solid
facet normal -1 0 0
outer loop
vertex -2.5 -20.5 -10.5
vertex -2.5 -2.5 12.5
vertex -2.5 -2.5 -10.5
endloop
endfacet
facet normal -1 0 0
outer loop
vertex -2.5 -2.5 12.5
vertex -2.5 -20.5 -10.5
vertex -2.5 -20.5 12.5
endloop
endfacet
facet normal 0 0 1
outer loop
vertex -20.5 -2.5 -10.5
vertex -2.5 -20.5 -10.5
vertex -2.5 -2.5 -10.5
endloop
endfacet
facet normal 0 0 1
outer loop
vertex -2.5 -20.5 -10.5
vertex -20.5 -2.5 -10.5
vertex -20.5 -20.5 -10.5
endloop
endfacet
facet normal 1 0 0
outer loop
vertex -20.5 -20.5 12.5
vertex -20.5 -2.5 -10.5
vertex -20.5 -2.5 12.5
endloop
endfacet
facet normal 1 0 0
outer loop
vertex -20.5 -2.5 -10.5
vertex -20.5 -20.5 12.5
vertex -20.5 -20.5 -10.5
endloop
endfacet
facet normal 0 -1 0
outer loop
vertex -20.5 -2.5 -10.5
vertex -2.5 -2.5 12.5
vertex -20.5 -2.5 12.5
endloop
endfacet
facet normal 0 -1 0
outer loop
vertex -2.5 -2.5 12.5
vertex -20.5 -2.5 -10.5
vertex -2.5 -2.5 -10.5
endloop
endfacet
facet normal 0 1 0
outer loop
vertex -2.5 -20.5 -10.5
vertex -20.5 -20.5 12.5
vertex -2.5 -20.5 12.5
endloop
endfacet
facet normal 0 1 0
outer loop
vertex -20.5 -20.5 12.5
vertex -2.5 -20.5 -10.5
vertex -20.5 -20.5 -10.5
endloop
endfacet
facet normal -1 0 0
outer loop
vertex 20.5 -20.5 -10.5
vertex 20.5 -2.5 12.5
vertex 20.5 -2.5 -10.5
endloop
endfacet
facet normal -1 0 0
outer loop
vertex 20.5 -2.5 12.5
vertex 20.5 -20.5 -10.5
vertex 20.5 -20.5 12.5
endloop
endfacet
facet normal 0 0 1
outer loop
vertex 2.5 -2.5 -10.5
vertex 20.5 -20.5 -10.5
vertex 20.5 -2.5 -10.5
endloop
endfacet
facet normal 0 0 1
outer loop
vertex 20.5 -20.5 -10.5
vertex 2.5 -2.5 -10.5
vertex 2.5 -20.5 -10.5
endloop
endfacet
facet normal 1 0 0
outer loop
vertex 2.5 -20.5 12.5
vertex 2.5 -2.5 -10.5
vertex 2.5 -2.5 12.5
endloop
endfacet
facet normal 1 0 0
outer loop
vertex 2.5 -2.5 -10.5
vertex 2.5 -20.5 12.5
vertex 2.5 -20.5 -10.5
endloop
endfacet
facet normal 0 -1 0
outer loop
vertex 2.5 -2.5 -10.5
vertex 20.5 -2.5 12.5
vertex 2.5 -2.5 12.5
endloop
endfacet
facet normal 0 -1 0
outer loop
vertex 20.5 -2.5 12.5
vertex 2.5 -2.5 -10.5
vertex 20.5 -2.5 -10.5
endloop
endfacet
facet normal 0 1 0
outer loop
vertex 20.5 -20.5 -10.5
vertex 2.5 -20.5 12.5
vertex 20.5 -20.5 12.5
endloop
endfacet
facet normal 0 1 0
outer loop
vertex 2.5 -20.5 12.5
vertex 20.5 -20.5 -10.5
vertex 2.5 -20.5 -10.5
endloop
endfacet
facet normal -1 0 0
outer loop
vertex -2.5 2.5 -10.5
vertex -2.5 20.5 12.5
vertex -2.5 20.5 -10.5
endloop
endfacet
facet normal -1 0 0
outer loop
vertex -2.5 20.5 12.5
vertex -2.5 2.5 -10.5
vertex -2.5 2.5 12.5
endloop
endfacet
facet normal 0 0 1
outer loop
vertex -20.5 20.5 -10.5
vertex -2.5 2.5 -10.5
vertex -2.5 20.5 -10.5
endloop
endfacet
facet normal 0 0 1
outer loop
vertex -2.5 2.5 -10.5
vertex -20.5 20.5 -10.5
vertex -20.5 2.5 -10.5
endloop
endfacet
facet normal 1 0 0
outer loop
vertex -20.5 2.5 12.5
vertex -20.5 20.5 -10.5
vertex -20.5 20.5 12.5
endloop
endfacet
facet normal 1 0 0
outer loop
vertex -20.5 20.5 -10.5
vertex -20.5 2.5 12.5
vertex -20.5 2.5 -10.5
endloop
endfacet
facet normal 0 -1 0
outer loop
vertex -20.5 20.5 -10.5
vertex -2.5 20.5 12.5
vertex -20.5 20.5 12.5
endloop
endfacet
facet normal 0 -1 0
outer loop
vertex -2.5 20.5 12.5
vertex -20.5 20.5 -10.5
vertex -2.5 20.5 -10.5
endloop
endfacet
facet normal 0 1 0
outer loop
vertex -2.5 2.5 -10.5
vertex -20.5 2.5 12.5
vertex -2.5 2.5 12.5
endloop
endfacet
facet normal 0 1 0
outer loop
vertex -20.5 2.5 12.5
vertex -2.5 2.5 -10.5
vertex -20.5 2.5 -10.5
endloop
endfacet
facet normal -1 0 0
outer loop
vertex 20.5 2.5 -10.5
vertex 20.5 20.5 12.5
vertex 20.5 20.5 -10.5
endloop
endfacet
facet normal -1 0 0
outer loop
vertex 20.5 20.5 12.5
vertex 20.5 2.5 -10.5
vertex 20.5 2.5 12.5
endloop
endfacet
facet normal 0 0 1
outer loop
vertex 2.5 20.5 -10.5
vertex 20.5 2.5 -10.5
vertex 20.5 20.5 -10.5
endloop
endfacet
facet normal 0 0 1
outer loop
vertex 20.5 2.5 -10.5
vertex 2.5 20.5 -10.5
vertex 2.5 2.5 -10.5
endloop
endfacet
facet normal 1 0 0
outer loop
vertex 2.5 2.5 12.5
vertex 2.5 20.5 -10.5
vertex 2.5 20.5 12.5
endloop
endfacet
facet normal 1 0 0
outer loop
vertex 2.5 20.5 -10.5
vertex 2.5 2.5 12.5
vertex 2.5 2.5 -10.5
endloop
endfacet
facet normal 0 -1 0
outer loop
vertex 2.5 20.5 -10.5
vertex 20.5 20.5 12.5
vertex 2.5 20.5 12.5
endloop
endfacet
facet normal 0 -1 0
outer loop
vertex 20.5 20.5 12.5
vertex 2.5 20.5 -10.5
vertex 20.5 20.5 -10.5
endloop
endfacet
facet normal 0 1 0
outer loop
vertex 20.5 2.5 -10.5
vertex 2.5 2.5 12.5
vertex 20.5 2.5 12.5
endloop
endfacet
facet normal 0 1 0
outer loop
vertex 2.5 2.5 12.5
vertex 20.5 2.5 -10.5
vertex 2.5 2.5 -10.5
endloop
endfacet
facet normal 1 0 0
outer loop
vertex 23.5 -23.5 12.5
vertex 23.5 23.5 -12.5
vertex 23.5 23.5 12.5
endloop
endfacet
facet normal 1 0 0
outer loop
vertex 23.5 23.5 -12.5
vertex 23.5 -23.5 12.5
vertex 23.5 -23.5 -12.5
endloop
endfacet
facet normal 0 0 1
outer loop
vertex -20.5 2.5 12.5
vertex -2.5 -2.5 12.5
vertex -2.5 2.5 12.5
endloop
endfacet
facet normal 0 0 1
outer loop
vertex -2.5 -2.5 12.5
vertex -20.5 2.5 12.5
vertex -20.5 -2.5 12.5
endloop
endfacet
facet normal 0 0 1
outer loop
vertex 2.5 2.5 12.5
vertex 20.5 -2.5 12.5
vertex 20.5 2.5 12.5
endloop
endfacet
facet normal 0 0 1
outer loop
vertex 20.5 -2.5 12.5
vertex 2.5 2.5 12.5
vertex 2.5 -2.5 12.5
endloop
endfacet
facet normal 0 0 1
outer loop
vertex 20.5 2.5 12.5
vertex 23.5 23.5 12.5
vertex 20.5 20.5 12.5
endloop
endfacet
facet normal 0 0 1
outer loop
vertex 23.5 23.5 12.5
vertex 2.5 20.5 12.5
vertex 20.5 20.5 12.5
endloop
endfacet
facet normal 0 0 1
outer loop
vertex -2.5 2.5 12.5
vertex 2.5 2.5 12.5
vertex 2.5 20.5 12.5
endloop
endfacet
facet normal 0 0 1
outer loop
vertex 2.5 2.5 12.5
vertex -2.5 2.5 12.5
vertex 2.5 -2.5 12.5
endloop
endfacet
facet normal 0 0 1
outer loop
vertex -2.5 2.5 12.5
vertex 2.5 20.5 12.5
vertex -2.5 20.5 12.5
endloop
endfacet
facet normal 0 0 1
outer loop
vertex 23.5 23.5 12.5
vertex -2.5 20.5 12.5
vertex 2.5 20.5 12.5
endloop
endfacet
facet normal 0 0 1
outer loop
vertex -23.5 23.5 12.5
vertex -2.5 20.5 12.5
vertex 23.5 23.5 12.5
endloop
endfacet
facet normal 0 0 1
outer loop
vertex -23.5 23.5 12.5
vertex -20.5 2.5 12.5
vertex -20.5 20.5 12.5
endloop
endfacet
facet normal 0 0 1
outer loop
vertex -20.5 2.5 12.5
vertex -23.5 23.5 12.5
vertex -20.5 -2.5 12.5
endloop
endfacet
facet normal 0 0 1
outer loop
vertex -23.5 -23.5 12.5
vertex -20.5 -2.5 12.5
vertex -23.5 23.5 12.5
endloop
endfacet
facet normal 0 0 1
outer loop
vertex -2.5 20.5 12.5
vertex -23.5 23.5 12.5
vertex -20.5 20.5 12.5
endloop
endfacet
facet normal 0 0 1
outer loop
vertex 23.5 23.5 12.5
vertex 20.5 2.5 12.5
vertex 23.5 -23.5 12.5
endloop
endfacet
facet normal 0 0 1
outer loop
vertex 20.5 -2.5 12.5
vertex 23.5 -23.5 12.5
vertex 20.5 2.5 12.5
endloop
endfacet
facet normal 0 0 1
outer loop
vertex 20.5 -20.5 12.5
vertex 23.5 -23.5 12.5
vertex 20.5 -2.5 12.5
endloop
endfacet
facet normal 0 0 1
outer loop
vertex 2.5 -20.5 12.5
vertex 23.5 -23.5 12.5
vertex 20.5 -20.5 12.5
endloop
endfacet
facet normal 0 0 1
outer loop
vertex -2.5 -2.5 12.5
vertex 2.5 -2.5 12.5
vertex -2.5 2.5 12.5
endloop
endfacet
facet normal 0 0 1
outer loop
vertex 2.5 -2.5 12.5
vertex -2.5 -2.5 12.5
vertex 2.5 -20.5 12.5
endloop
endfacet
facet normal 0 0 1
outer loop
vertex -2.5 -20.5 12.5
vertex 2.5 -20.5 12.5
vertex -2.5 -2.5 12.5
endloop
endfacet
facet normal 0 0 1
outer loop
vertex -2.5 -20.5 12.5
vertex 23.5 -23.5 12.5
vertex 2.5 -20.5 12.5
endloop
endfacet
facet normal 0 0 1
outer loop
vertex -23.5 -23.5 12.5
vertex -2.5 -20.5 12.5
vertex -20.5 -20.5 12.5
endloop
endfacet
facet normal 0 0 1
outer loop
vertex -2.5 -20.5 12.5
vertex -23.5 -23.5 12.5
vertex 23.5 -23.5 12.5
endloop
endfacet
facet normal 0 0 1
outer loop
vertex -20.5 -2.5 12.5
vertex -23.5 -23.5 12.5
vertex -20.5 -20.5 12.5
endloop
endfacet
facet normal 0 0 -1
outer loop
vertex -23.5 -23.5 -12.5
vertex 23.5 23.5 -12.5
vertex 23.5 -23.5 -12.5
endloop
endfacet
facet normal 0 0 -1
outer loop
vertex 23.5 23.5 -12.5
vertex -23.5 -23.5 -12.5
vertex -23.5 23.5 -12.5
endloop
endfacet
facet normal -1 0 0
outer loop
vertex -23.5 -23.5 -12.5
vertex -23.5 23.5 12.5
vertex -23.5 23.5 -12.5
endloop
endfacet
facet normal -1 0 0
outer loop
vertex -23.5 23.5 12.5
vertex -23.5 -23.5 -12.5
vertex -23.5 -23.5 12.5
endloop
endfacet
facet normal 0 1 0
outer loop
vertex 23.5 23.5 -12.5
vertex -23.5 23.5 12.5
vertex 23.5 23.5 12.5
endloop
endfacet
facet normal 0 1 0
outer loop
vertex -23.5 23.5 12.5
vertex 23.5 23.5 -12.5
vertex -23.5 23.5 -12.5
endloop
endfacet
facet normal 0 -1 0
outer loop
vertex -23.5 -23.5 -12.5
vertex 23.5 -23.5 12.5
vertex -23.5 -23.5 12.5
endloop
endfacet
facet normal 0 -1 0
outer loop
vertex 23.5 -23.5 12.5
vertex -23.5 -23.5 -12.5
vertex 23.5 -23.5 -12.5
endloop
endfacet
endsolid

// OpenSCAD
$fn = 32;

// ----------------------------------------------------------------------
// Pocket plate 47 x 47 x 25
// 2 x 2 pockets 18 mm square, 23 mm deep
// ----------------------------------------------------------------------

// --- parameters (mm) ---
thickness = 25;  // plate thickness
floor_t = 2;     // material left under each pocket
pocket = 18;     // pocket side length
pitch_x = 23;    // pocket pitch along X
pitch_y = 23;    // pocket pitch along Y
cols = 2;        // pockets per row
rows = 2;        // rows of pockets

// --- derived feature positions (mm) ---
depth = thickness - floor_t;        // = 23   pocket depth, down to the floor
span_x = (cols - 1) * pitch_x;      // = 23   distance between outer pockets
span_y = (rows - 1) * pitch_y;      // = 23   distance between outer pocket rows
origin_x = -span_x / 2;             // = -11.5   X of the first pocket
origin_y = -span_y / 2;             // = -11.5   Y of the first pocket
plate = [span_x + pocket + 6, span_y + pocket + 6, thickness];  // = [47, 47, 25]   overall size: pockets plus 3 mm of wall on each side
feature_centers = [
  [origin_x + 0 * pitch_x, origin_y + 0 * pitch_y],
  [origin_x + 1 * pitch_x, origin_y + 0 * pitch_y],
  [origin_x + 0 * pitch_x, origin_y + 1 * pitch_y],
  [origin_x + 1 * pitch_x, origin_y + 1 * pitch_y]
];   // pocket centres, used verbatim by the cutter loop

// plate outline, then one pocket per centre in feature_centers
difference() {
  cube(plate, center = true);
  for (centre = feature_centers)
    translate([centre[0] - pocket / 2, centre[1] - pocket / 2, plate[2] / 2 - depth])
      cube([pocket, pocket, depth + 1]);  // centred on the declared pocket centre
}
